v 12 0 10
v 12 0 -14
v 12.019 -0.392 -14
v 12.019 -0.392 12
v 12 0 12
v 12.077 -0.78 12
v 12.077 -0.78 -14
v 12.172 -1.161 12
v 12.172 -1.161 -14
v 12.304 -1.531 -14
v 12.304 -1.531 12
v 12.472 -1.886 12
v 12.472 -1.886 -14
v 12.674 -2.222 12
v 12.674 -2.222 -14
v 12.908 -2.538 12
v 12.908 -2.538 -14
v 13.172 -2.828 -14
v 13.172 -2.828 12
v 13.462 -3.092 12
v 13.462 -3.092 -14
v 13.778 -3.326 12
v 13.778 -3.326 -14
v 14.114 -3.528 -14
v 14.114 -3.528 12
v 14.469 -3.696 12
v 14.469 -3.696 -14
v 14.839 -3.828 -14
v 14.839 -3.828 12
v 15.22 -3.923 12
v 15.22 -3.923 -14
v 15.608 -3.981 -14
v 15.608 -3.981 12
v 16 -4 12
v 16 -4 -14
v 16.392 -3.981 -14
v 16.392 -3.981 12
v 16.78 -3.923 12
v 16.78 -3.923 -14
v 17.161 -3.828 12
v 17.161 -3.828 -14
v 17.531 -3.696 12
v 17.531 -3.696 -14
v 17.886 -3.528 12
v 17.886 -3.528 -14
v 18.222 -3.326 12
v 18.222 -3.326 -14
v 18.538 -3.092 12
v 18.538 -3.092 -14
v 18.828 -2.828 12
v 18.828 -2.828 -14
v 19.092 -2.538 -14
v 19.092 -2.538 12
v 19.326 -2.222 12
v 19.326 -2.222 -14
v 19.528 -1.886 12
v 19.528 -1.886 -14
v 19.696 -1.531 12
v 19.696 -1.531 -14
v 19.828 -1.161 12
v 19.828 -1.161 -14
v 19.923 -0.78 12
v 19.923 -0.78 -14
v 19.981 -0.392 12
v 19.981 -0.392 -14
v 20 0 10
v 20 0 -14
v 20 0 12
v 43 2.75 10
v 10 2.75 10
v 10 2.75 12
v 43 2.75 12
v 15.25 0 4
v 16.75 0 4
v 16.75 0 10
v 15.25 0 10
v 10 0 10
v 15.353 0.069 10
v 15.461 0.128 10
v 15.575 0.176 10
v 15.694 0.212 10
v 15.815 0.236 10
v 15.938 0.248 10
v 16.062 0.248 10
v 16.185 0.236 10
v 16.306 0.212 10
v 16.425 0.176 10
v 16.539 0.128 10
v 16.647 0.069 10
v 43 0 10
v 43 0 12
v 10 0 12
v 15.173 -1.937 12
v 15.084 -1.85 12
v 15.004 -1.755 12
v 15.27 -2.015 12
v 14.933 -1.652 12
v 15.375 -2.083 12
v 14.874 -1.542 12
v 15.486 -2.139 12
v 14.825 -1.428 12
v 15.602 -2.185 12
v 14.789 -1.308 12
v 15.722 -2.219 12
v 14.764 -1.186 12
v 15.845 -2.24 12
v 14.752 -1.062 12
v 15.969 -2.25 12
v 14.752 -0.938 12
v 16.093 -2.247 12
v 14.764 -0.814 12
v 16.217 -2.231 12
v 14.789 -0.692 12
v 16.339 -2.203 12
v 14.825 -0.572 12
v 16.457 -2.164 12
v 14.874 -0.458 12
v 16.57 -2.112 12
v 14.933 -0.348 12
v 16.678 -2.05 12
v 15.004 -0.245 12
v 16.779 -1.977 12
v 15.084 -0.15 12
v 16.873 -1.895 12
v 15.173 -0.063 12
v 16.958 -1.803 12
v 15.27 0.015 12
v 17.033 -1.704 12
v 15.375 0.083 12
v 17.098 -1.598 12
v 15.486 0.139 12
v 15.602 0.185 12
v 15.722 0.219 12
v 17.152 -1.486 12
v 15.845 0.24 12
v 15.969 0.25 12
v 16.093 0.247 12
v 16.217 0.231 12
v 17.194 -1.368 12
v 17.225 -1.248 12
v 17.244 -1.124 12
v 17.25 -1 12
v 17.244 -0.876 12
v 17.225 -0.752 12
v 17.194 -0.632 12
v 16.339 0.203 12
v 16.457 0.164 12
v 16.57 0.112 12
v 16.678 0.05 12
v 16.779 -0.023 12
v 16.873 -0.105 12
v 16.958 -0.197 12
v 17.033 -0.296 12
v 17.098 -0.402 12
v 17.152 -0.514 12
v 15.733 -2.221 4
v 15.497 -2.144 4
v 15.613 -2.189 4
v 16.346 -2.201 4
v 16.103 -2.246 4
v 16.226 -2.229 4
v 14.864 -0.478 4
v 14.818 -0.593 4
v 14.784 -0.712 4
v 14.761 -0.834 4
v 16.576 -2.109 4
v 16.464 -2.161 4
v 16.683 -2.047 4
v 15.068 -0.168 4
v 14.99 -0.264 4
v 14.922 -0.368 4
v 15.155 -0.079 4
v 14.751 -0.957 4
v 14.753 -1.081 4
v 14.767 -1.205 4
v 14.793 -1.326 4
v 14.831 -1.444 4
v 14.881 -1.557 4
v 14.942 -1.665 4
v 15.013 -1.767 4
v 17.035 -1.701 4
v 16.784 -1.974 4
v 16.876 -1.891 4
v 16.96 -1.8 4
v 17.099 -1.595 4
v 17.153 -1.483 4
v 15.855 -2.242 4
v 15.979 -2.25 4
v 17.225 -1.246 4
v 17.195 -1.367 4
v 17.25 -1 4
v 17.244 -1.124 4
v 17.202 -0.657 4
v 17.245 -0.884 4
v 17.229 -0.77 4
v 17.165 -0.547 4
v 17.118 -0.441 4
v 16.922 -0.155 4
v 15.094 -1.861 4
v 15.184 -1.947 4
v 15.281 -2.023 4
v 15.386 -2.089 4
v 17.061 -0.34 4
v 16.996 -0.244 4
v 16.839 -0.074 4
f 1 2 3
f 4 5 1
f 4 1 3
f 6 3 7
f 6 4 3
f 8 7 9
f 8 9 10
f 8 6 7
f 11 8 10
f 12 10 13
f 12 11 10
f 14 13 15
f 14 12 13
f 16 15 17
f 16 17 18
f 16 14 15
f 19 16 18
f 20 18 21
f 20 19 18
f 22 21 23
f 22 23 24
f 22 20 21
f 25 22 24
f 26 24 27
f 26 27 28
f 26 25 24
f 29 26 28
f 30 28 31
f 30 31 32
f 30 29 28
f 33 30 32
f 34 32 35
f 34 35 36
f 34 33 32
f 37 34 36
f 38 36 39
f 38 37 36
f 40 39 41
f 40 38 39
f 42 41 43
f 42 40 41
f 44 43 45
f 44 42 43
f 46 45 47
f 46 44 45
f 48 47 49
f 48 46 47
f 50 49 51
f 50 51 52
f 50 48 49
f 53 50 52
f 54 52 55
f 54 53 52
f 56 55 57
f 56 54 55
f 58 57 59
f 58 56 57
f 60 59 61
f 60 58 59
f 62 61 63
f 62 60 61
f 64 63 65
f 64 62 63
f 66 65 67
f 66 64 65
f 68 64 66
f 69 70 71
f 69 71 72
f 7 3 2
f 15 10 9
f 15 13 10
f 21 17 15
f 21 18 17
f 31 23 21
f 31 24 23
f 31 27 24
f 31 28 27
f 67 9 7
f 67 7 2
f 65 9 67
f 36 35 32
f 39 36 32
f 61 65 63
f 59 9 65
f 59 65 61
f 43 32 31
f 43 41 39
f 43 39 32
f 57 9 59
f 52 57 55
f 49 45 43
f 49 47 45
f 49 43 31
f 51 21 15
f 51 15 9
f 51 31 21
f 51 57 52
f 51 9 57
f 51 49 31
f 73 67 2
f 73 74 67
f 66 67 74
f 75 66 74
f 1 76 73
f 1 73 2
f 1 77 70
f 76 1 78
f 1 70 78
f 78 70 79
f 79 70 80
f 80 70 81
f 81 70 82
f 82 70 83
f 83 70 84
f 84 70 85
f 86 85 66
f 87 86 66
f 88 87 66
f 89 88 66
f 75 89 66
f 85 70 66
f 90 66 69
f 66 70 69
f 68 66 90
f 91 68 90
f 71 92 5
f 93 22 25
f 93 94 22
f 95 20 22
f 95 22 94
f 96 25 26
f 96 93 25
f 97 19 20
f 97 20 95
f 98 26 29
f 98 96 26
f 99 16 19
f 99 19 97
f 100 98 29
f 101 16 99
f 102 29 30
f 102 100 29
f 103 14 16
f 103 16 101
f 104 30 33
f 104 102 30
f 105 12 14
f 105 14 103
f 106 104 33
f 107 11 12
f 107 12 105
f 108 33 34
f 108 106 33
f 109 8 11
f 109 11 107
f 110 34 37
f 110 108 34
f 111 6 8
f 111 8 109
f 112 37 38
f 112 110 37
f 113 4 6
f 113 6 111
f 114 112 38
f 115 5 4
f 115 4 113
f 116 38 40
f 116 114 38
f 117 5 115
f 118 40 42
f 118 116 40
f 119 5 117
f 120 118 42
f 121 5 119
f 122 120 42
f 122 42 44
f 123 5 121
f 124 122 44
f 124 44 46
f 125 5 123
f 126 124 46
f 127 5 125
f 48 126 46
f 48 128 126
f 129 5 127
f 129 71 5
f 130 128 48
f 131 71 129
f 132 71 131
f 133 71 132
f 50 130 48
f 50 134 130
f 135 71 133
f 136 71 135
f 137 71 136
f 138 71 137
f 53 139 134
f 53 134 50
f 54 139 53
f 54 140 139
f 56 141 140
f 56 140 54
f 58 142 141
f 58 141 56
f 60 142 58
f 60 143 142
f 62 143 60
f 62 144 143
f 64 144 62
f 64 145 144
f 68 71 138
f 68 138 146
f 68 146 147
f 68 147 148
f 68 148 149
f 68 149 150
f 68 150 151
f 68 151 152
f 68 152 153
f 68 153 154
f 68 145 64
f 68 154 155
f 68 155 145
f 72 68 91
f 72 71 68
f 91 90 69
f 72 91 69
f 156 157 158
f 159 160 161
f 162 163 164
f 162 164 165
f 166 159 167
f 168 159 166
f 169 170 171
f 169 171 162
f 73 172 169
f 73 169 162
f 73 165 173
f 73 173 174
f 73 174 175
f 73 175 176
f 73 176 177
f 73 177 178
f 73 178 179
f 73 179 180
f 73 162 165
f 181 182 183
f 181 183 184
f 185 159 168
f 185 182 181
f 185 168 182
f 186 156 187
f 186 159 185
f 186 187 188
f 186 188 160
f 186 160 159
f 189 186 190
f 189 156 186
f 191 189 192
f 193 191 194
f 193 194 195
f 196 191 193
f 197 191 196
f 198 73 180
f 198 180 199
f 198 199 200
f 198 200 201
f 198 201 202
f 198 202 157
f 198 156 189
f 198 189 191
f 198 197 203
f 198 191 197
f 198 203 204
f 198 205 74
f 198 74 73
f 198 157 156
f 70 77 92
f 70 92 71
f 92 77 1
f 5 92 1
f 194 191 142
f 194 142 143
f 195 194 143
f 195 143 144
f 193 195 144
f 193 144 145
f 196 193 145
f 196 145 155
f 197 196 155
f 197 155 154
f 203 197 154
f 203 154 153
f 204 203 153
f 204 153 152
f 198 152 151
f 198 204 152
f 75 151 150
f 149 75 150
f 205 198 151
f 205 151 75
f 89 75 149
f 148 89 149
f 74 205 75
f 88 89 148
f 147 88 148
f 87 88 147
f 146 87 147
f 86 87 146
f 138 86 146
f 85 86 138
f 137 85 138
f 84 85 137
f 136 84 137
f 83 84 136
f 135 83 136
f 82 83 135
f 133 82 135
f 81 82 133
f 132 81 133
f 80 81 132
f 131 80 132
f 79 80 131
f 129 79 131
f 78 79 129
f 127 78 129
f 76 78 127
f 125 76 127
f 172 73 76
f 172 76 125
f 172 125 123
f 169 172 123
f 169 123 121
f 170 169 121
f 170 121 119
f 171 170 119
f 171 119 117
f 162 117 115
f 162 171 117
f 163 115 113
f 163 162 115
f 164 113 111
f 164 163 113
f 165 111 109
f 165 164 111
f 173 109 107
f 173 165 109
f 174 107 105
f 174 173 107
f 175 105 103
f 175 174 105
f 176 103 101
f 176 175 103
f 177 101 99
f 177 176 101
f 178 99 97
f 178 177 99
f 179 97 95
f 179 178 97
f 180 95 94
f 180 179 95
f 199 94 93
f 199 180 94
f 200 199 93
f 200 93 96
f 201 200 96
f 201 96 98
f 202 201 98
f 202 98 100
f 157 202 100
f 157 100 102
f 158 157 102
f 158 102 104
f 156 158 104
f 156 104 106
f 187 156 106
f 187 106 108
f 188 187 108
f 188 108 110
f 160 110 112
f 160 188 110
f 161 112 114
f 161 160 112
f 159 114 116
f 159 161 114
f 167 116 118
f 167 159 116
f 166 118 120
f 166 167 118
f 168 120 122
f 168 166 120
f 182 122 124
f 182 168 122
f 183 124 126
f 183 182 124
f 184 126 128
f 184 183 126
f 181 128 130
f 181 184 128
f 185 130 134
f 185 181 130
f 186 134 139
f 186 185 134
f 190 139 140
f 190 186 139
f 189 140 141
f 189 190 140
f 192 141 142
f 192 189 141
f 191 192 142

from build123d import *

# Parameters (mm, degrees)
CYLINDER004_R     = 1.25
CYLINDER004_DEPTH = 10
BOX005_W          = 33
BOX005_H          = 2.75
BOX005_DEPTH      = 2
CYLINDER_W        = 4
CYLINDER_H        = 26
CYLINDER_ANGLE    = 180


with BuildPart() as b_sw:
    # Cylinder004 → Cylinder004 (new body)
    with BuildSketch(Plane(origin=(10, -1, 4), x_dir=(1, 0, 0), z_dir=(0, 0, 1))):
        Circle(CYLINDER004_R)
    extrude(amount=CYLINDER004_DEPTH)


with BuildPart() as s013:
    # Box005 → Box005 (new body)
    with BuildSketch(Plane(origin=(4, 0, 10), x_dir=(1, 0, 0), z_dir=(0, 0, 1))):
        with Locations((16.5, 1.375)):
            Rectangle(BOX005_W, BOX005_H)
    extrude(amount=BOX005_DEPTH)


with BuildPart() as cut015_ssw:
    # Cylinder → Cylinder (revolve)
    with BuildSketch(Plane(origin=(10, 0, -14), x_dir=(-1, 0, 0), z_dir=(0, 1, 0))):
        with Locations((2, 13)):
            Rectangle(CYLINDER_W, CYLINDER_H)
    revolve(axis=Axis((10, 0, -14), (0, 0, 1)), revolution_arc=CYLINDER_ANGLE)

    # Fusion009: union S013
    add(s013.part)

    # Cut015: cut B_SW
    add(b_sw.part, mode=Mode.SUBTRACT)


with BuildPart() as cut015_ssw_1:
    # Cut015 placement: moved
    add(cut015_ssw.part.moved(Location((6, 0, 0))))


solid = cut015_ssw_1.part
